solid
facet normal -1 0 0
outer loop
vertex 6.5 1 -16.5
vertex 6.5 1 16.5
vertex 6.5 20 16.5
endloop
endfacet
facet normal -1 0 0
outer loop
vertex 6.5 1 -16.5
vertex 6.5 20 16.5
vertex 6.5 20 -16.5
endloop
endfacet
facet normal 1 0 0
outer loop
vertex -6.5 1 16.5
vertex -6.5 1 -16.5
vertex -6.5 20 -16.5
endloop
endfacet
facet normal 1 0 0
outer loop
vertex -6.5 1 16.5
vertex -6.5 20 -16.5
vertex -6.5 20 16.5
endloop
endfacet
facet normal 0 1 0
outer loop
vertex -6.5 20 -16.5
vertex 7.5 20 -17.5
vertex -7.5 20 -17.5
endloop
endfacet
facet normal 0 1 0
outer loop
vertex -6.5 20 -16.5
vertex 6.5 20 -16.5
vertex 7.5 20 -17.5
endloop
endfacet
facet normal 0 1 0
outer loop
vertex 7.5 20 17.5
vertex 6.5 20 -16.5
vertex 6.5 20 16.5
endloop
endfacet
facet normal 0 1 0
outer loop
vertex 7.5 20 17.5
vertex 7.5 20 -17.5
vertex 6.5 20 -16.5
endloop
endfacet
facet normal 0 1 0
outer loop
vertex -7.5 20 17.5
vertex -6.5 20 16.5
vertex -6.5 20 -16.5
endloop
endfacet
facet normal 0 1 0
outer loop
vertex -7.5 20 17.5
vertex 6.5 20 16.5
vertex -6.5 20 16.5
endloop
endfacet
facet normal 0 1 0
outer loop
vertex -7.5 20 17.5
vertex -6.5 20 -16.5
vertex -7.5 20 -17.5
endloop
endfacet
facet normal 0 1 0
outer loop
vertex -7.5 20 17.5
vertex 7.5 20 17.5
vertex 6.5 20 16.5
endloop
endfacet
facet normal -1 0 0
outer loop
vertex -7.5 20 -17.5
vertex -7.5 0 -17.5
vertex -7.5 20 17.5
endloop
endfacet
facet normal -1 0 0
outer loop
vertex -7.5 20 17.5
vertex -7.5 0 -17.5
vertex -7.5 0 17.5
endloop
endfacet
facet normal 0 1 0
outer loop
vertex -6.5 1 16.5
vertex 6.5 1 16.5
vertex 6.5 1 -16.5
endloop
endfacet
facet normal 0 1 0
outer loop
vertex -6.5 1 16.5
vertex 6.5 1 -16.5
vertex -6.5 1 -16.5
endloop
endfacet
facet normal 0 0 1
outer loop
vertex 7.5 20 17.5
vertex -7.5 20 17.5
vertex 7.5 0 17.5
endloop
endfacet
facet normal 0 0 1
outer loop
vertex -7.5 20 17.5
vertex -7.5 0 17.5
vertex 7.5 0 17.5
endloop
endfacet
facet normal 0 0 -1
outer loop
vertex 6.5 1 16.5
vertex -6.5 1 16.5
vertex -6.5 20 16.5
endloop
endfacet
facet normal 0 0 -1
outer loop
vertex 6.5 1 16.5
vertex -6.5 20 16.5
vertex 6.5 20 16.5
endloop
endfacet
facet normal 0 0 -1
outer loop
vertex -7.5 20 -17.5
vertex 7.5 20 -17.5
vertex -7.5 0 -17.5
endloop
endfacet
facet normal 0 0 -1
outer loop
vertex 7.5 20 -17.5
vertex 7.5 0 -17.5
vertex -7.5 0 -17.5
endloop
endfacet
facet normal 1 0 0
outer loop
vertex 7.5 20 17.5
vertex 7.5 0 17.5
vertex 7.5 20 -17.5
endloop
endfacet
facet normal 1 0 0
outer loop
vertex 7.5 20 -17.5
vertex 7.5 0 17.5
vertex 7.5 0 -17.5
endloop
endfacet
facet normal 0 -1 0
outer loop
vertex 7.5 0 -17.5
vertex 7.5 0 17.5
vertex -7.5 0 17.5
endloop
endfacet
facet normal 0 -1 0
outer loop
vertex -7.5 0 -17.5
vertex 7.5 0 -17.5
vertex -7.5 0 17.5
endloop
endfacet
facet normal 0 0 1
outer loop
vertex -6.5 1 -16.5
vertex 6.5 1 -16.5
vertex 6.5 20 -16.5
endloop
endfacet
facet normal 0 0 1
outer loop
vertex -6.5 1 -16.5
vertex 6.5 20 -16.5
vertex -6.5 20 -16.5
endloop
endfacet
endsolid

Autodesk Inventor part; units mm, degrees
ref_plane "YZ Plane" through (0, 0, 0) normal (1, 0, 0) x (0, 1, 0)
ref_plane "XZ Plane" through (0, 0, 0) normal (0, 1, 0) x (-1, 0, 0)
ref_plane "XY Plane" through (0, 0, 0) normal (0, 0, 1) x (1, 0, 0)
sketch "Sketch1" plane through (0, 0, 0) normal (0, 1, 0) x (-1, 0, 0)
  line L0 (7.5, 17.5) -> (-7.5, 17.5)
  line L1 (-7.5, 17.5) -> (-7.5, -17.5)
  line L2 (-7.5, -17.5) -> (7.5, -17.5)
  line L3 (7.5, -17.5) -> (7.5, 17.5)
  line L4 (7.5, 17.5) -> (-7.5, -17.5) construction
  line L5 (-7.5, 17.5) -> (7.5, -17.5) construction
  point P0 (0, 0)
  dimension "d0" = 35
  dimension "d1" = 15
extrude "Extrusion1" add sketch "Sketch1" along normal blind 20
shell "Shell1" thickness 1 removed faces 1 at (2.5, 20, -5.8333)
properties part number "servo housing"
